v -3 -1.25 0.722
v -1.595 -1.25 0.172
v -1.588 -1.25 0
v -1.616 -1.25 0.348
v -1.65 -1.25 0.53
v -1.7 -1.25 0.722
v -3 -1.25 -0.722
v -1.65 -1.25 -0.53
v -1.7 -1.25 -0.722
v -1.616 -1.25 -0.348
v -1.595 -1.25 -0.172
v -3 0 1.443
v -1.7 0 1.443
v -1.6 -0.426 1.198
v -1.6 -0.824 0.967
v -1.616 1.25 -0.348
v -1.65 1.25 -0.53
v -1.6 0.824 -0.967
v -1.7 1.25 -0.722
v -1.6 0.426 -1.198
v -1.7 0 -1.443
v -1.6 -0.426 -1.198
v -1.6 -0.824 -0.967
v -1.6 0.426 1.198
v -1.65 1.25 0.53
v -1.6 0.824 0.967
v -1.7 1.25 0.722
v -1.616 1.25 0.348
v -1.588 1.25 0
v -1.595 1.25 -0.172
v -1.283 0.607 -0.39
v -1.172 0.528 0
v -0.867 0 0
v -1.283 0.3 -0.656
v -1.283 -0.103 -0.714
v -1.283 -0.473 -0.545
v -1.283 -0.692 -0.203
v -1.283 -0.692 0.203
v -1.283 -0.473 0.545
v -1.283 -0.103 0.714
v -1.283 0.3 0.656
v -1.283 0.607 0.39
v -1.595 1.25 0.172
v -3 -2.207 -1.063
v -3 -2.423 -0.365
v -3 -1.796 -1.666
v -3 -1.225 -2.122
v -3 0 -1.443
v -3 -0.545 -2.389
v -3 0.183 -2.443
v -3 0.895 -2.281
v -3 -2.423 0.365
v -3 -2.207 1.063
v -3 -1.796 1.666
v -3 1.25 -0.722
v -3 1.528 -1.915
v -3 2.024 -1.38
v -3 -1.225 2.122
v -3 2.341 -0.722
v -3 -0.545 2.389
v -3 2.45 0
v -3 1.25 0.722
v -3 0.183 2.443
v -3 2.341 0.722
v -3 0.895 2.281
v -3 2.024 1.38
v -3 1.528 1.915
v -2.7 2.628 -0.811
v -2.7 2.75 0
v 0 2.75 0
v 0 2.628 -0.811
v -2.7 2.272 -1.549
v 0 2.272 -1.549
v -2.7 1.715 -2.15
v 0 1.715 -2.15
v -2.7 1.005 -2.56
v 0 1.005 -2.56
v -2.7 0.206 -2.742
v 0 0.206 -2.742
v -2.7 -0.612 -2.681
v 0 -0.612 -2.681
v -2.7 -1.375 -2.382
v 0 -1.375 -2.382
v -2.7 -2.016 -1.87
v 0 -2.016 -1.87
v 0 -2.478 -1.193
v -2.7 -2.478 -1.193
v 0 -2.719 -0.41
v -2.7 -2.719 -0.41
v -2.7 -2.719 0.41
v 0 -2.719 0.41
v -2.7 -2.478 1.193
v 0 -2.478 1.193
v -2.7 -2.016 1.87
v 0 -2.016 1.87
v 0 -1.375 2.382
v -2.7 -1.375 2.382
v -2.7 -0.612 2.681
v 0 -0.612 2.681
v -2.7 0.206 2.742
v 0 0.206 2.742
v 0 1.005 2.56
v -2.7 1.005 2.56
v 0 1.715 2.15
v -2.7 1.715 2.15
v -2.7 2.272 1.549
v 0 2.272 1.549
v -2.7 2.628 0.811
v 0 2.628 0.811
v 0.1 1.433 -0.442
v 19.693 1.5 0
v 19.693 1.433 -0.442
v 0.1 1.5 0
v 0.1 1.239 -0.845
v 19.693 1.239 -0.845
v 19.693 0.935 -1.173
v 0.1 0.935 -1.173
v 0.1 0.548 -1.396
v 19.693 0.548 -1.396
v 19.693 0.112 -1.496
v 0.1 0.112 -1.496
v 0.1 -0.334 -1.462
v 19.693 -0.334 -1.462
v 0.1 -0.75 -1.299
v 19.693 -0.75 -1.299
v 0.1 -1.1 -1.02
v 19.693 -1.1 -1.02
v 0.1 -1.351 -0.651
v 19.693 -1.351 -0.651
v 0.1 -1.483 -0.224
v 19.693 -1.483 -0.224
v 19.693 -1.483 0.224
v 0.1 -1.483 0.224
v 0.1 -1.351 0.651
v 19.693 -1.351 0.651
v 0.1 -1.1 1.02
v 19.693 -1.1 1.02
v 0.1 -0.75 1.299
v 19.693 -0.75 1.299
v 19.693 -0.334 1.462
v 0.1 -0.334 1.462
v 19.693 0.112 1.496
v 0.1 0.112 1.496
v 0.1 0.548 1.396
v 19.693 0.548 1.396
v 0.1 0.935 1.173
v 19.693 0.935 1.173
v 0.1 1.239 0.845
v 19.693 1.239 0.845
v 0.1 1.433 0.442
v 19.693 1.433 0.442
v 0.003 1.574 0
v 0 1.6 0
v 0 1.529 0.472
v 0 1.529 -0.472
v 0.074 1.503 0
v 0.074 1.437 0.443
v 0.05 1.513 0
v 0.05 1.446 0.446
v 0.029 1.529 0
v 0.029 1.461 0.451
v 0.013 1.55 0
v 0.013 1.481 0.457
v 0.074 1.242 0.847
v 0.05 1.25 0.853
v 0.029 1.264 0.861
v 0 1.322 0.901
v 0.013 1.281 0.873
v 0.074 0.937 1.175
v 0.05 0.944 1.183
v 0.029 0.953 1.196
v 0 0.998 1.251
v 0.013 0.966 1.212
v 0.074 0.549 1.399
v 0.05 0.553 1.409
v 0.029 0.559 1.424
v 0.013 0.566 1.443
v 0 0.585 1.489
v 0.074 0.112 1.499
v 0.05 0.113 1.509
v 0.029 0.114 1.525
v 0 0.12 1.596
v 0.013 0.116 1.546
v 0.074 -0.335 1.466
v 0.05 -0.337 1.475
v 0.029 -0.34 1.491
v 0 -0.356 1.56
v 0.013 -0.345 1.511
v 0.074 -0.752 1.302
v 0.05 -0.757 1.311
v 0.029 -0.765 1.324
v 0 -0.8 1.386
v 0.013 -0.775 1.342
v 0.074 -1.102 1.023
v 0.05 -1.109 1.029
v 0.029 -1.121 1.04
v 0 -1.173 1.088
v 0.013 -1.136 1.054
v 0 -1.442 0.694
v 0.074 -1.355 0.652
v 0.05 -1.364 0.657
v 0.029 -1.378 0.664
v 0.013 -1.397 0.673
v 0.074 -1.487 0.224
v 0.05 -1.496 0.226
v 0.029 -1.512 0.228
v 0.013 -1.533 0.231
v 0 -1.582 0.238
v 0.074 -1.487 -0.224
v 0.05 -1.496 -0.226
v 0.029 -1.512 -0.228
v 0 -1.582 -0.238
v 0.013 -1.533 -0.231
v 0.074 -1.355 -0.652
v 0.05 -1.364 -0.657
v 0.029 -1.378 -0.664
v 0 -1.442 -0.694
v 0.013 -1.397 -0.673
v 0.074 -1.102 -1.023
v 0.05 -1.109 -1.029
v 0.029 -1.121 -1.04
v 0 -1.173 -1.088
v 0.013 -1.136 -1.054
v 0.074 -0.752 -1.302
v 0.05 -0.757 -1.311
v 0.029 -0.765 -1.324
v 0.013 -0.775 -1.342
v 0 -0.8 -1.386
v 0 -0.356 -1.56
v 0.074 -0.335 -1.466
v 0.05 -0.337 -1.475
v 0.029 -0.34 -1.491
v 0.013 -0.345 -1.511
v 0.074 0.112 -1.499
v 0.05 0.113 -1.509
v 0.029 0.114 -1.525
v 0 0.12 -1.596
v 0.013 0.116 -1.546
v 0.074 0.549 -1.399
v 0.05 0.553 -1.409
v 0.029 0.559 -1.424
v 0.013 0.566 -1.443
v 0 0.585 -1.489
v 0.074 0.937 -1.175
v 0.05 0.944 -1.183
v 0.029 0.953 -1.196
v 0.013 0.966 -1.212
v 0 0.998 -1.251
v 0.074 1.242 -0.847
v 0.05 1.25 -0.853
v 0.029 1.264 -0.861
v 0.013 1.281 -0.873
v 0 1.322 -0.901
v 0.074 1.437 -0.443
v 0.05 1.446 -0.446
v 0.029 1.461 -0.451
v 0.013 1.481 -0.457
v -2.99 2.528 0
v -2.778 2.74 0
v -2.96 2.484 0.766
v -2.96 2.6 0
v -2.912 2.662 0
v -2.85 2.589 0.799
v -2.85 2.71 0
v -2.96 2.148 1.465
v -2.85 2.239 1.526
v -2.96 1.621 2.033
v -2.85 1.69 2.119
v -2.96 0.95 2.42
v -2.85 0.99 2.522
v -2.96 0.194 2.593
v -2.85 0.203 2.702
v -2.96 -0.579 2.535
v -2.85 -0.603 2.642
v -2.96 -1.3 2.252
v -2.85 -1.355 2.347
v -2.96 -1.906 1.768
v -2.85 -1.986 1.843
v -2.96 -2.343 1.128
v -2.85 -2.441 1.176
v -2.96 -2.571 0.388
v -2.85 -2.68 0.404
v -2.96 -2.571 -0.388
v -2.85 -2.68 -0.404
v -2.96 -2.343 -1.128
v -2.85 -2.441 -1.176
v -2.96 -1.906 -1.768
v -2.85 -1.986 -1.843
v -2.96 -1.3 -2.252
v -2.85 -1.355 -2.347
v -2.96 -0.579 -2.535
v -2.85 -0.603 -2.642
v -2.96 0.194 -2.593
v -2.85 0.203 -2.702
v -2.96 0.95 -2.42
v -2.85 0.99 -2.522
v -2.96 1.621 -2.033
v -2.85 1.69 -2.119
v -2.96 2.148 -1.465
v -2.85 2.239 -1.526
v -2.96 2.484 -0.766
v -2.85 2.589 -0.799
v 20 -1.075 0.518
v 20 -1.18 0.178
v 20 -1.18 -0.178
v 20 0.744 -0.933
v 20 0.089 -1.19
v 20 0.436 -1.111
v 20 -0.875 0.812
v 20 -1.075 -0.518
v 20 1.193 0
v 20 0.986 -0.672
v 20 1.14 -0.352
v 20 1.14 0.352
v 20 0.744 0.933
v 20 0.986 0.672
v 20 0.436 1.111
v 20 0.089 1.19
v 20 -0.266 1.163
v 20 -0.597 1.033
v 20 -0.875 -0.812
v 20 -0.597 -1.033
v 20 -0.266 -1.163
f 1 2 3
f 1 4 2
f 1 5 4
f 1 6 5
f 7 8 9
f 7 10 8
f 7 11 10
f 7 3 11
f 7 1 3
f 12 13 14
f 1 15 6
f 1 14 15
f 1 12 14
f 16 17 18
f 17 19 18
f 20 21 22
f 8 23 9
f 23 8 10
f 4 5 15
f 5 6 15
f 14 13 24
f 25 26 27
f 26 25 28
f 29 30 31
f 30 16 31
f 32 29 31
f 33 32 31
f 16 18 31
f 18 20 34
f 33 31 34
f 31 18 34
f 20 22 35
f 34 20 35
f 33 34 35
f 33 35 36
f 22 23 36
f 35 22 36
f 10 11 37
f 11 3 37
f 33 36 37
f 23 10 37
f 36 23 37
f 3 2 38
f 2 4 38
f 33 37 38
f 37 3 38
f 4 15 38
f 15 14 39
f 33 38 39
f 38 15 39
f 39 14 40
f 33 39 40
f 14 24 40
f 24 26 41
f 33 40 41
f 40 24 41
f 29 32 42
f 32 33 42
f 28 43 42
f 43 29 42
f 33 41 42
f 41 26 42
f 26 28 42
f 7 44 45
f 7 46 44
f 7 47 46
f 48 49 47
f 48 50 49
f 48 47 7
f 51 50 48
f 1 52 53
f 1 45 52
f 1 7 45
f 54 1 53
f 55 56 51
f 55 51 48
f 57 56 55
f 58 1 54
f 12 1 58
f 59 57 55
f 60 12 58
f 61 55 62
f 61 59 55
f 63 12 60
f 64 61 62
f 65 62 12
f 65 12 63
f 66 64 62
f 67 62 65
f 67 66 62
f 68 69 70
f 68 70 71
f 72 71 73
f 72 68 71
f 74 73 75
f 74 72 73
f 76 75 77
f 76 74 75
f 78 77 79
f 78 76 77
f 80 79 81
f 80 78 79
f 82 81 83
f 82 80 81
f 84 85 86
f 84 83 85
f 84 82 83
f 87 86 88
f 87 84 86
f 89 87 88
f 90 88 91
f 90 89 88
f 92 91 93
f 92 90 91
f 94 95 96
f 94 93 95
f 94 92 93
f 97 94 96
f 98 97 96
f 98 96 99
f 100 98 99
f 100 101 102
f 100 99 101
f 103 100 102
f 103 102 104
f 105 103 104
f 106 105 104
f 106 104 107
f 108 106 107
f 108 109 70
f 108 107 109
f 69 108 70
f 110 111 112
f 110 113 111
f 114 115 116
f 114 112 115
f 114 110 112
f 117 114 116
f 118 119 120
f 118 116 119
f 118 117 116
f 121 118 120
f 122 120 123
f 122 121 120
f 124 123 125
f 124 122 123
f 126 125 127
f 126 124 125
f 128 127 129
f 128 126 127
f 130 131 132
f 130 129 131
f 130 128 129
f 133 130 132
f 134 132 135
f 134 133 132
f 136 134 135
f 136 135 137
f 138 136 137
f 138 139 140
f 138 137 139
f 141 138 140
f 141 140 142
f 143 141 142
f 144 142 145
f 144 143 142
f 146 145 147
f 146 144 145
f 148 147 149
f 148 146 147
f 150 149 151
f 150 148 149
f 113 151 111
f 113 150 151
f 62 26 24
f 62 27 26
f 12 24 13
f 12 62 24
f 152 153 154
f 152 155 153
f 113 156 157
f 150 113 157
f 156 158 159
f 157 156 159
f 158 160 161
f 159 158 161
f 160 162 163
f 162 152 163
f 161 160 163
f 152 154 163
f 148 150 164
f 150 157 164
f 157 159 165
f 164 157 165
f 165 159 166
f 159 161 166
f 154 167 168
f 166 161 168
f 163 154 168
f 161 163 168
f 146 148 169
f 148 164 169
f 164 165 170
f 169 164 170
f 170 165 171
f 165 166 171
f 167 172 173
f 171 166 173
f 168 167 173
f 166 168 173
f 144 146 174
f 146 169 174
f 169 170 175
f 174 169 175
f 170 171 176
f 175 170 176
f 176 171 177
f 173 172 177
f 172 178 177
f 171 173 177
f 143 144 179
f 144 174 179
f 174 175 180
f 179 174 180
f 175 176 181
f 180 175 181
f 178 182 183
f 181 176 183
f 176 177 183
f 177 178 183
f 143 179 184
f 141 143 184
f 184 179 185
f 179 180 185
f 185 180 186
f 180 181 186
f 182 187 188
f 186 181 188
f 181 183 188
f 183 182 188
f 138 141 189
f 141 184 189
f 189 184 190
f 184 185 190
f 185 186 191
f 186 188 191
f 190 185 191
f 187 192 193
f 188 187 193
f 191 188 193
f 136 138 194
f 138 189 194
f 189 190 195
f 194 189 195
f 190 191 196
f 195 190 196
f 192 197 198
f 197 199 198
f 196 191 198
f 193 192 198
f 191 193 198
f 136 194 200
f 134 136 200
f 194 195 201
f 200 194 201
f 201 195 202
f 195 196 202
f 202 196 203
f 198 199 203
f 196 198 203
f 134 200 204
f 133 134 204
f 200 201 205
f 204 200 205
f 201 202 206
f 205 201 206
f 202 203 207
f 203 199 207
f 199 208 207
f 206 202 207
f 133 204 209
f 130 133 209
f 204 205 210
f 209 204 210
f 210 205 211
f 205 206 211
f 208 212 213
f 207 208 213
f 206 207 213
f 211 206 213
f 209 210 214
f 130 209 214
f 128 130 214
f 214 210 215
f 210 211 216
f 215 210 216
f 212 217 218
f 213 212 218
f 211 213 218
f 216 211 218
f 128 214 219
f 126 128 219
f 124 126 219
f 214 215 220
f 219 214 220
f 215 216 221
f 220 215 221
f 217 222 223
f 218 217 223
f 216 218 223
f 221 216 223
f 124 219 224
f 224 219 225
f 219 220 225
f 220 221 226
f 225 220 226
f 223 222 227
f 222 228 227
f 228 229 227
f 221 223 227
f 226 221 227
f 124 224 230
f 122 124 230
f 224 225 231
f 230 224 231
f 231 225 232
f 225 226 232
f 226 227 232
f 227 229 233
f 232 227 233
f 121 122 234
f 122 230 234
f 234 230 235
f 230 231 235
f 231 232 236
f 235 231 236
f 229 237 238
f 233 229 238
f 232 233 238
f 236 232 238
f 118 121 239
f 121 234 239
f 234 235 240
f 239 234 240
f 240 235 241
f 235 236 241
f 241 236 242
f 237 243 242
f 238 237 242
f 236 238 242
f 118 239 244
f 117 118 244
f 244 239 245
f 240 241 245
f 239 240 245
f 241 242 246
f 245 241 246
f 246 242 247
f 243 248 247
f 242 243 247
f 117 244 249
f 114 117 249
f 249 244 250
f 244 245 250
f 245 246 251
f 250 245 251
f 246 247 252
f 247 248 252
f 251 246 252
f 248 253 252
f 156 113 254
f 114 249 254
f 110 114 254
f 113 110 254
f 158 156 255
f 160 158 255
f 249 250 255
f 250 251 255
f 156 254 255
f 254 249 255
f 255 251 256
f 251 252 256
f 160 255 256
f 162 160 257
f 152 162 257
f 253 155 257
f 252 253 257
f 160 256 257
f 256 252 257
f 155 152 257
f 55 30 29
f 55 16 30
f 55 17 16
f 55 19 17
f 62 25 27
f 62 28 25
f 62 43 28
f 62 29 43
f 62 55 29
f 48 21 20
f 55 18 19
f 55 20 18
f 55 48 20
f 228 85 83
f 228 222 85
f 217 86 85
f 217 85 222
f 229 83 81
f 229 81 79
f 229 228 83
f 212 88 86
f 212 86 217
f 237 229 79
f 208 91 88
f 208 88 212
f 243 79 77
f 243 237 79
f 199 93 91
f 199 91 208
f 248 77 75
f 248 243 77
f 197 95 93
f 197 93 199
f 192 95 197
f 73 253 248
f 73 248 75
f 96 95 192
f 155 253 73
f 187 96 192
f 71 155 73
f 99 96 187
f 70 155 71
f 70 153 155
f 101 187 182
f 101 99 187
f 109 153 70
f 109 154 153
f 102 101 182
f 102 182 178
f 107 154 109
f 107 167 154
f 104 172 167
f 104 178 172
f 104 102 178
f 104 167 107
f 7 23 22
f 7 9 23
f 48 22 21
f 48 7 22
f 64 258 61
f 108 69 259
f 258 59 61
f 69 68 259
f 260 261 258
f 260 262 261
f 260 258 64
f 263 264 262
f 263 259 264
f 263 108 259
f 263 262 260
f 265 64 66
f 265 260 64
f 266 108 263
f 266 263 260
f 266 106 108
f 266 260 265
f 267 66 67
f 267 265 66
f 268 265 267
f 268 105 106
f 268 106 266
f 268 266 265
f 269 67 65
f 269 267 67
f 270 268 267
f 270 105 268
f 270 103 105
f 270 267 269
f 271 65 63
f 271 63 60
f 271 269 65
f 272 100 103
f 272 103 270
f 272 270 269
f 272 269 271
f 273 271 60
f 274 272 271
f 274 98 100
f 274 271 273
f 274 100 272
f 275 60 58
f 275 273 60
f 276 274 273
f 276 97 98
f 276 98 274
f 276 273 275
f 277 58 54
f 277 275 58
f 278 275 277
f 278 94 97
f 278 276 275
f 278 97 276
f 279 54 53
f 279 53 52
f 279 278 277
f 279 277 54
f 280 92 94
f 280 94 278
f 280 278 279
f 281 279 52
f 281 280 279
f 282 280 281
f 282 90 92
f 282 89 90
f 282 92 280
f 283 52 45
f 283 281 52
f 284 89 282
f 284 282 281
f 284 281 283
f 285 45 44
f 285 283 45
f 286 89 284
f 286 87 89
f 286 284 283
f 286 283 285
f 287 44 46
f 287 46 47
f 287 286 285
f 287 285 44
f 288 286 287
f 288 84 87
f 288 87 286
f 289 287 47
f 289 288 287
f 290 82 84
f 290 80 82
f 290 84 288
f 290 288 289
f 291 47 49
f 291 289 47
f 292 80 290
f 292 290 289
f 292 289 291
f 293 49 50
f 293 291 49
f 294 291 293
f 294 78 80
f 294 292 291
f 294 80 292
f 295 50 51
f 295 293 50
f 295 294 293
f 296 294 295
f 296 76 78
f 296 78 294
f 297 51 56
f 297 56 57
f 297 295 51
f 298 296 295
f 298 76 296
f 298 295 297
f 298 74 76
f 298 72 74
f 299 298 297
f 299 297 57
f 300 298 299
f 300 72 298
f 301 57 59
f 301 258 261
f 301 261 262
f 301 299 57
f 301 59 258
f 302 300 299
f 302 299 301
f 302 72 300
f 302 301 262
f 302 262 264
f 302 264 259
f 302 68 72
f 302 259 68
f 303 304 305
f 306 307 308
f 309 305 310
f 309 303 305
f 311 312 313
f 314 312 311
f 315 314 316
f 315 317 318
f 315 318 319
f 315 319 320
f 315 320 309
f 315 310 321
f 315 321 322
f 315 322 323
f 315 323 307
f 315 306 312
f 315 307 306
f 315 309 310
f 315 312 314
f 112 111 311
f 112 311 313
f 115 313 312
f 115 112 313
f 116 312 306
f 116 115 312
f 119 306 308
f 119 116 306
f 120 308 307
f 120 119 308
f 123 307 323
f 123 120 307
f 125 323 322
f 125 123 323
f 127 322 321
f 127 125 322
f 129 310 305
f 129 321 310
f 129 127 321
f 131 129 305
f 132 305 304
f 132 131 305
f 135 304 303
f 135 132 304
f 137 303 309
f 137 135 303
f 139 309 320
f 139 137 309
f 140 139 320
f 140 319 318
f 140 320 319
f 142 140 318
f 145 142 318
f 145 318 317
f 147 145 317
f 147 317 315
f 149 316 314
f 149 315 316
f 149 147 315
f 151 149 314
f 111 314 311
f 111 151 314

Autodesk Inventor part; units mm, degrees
ref_plane "YZ Plane" through (0, 0, 0) normal (1, 0, 0) x (0, 1, 0)
ref_plane "XZ Plane" through (0, 0, 0) normal (0, 1, 0) x (-1, 0, 0)
sketch "Sketch1" plane through (0, 0, 0) normal (0, 0, 1) x (1, 0, 0)
  line L0 (-0.8667, 0) -> (20, 0)
  line L1 (20, 0) -> (20, 1.5)
  line L2 (20, 1.5) -> (1.25, 1.5)
  line L3 (1.25, 1.5) -> (0.9432, 1.5)
  line L4 (0.9432, 1.5) -> (0, 1.5)
  line L5 (0, 1.5) -> (0, 2.75)
  line L6 (0, 2.75) -> (-3, 2.75)
  line L7 (-3, 2.75) -> (-3, 1.4434)
  line L8 (-3, 1.4434) -> (-1.7, 1.4434)
  line L9 (-1.7, 1.4434) -> (-0.8667, 0)
  line L10 (-7.6, 0) -> (24.6, 0) projected
  line L11 (0, -0.55) -> (0, 3.3) projected
  line L12 (1.25, 1.5) -> (0, 1.5) construction
  dimension "d1" = 18.75
  dimension "d2" = 0.3068
  dimension "d3" = 3
  dimension "d4" = 1.3
  dimension "d5" = 60
  dimension "d6" = 3
  dimension "d7" = 3
  dimension "d8" = 2.8868
  dimension "d9" = 5.5
  dimension "d26" = 20
revolve "Body" add sketch "Sketch1" angle 360 about axis through (-0.8667, 0, 0) along (1, 0, 0)
sketch "Sketch2" plane through (-3, 0, 0) normal (-1, 0, 0) x (0, 0, 1)
  circle A0 centre (0, 0) radius 1.4434 projected
  line L0 (0, -3.85) -> (0, 3.85) projected
  line L1 (-3.85, 0) -> (3.85, 0) projected
  line L2 (1.4434, 0) -> (0.7217, -1.25)
  line L3 (0.7217, -1.25) -> (-0.7217, -1.25)
  line L4 (-0.7217, -1.25) -> (-1.4434, 0)
  line L5 (-1.4434, 0) -> (-0.7217, 1.25)
  line L6 (-0.7217, 1.25) -> (0.7217, 1.25)
  line L7 (0.7217, 1.25) -> (1.4434, 0)
  point P0 (0, 0)
extrude "Slot" add sketch "Sketch2" against normal up to next contours L7 A0 | A0 L2 | L6 L0 A0 | A0 L0 L3 | L0 L6 A0 | A0 L3 L0 | L4 A0 | A0 L5
fillet "Fillet1" radius 0.3 1 edges at (-3, -2.75, 0)
thread "Thread" size "M3x0.5" class "6g" standard "ISO Metric profile" length 18.75
chamfer "Chamfer1" distance 0.3067 distance2 0.3067 1 edges at (20, -1.5, 0) measured on face at (20, -0.7567, -0.3972)
ref_plane "Work Plane1" through (29, 0, 0) normal (0, -1, 0) x (1, 0, 0)
fillet "Fillet2" radius 0.1 1 edges at (0, -1.5, 0)
equation "\"d1\" = GEL"
equation "\"d3\" = KOH"
equation "\"d4\" = INTI"
equation "\"d6\" = GD"
equation "\"d7\" = BDM"
equation "\"d8\" = 1.1547 * SW"
equation "\"d9\" = KOD"
equation "\"d26\" = NLG"
equation "\"d30\" = R"
equation "\"d17\" = RR"
equation "\"d13\" = GEL"
equation "\"d15\" = -0.5 * SPD + 0.5 * GD"
equation "\"d16\" = GUL"
equation "\"GD\" = NND"
equation "\"NLG\" = 20"
equation "\"GEL\" = 18.75"
equation "\"KOD\" = 5.5"
equation "\"KOH\" = 3"
equation "\"INTI\" = 1.3"
equation "\"GAL\" = 0.61345 * PTC"
equation "\"GUL\" = 0.61345 * PTC"
equation "\"BDM\" = NND"
equation "\"SW\" = 2.5"
equation "\"RR\" = 0.3"
equation "\"SPD\" = NND - 1.2269 * PTC"
equation "\"R\" = 0.1"
equation "\"TOA\" = 30deg"
equation "\"GD1\" = THREADDIA - 1.2269 * PTC"
equation "\"THREADDIA\" = 3"
equation "\"FAWI\" = 45deg"
equation "\"ANG\" = 120deg"
equation "\"PTC\" = 0.5"
equation "\"NND\" = 3"
equation "\"E0\" = 1.155 * SW"
properties part number "DIN 912 - M3 x 20" material "Steel, Mild"
